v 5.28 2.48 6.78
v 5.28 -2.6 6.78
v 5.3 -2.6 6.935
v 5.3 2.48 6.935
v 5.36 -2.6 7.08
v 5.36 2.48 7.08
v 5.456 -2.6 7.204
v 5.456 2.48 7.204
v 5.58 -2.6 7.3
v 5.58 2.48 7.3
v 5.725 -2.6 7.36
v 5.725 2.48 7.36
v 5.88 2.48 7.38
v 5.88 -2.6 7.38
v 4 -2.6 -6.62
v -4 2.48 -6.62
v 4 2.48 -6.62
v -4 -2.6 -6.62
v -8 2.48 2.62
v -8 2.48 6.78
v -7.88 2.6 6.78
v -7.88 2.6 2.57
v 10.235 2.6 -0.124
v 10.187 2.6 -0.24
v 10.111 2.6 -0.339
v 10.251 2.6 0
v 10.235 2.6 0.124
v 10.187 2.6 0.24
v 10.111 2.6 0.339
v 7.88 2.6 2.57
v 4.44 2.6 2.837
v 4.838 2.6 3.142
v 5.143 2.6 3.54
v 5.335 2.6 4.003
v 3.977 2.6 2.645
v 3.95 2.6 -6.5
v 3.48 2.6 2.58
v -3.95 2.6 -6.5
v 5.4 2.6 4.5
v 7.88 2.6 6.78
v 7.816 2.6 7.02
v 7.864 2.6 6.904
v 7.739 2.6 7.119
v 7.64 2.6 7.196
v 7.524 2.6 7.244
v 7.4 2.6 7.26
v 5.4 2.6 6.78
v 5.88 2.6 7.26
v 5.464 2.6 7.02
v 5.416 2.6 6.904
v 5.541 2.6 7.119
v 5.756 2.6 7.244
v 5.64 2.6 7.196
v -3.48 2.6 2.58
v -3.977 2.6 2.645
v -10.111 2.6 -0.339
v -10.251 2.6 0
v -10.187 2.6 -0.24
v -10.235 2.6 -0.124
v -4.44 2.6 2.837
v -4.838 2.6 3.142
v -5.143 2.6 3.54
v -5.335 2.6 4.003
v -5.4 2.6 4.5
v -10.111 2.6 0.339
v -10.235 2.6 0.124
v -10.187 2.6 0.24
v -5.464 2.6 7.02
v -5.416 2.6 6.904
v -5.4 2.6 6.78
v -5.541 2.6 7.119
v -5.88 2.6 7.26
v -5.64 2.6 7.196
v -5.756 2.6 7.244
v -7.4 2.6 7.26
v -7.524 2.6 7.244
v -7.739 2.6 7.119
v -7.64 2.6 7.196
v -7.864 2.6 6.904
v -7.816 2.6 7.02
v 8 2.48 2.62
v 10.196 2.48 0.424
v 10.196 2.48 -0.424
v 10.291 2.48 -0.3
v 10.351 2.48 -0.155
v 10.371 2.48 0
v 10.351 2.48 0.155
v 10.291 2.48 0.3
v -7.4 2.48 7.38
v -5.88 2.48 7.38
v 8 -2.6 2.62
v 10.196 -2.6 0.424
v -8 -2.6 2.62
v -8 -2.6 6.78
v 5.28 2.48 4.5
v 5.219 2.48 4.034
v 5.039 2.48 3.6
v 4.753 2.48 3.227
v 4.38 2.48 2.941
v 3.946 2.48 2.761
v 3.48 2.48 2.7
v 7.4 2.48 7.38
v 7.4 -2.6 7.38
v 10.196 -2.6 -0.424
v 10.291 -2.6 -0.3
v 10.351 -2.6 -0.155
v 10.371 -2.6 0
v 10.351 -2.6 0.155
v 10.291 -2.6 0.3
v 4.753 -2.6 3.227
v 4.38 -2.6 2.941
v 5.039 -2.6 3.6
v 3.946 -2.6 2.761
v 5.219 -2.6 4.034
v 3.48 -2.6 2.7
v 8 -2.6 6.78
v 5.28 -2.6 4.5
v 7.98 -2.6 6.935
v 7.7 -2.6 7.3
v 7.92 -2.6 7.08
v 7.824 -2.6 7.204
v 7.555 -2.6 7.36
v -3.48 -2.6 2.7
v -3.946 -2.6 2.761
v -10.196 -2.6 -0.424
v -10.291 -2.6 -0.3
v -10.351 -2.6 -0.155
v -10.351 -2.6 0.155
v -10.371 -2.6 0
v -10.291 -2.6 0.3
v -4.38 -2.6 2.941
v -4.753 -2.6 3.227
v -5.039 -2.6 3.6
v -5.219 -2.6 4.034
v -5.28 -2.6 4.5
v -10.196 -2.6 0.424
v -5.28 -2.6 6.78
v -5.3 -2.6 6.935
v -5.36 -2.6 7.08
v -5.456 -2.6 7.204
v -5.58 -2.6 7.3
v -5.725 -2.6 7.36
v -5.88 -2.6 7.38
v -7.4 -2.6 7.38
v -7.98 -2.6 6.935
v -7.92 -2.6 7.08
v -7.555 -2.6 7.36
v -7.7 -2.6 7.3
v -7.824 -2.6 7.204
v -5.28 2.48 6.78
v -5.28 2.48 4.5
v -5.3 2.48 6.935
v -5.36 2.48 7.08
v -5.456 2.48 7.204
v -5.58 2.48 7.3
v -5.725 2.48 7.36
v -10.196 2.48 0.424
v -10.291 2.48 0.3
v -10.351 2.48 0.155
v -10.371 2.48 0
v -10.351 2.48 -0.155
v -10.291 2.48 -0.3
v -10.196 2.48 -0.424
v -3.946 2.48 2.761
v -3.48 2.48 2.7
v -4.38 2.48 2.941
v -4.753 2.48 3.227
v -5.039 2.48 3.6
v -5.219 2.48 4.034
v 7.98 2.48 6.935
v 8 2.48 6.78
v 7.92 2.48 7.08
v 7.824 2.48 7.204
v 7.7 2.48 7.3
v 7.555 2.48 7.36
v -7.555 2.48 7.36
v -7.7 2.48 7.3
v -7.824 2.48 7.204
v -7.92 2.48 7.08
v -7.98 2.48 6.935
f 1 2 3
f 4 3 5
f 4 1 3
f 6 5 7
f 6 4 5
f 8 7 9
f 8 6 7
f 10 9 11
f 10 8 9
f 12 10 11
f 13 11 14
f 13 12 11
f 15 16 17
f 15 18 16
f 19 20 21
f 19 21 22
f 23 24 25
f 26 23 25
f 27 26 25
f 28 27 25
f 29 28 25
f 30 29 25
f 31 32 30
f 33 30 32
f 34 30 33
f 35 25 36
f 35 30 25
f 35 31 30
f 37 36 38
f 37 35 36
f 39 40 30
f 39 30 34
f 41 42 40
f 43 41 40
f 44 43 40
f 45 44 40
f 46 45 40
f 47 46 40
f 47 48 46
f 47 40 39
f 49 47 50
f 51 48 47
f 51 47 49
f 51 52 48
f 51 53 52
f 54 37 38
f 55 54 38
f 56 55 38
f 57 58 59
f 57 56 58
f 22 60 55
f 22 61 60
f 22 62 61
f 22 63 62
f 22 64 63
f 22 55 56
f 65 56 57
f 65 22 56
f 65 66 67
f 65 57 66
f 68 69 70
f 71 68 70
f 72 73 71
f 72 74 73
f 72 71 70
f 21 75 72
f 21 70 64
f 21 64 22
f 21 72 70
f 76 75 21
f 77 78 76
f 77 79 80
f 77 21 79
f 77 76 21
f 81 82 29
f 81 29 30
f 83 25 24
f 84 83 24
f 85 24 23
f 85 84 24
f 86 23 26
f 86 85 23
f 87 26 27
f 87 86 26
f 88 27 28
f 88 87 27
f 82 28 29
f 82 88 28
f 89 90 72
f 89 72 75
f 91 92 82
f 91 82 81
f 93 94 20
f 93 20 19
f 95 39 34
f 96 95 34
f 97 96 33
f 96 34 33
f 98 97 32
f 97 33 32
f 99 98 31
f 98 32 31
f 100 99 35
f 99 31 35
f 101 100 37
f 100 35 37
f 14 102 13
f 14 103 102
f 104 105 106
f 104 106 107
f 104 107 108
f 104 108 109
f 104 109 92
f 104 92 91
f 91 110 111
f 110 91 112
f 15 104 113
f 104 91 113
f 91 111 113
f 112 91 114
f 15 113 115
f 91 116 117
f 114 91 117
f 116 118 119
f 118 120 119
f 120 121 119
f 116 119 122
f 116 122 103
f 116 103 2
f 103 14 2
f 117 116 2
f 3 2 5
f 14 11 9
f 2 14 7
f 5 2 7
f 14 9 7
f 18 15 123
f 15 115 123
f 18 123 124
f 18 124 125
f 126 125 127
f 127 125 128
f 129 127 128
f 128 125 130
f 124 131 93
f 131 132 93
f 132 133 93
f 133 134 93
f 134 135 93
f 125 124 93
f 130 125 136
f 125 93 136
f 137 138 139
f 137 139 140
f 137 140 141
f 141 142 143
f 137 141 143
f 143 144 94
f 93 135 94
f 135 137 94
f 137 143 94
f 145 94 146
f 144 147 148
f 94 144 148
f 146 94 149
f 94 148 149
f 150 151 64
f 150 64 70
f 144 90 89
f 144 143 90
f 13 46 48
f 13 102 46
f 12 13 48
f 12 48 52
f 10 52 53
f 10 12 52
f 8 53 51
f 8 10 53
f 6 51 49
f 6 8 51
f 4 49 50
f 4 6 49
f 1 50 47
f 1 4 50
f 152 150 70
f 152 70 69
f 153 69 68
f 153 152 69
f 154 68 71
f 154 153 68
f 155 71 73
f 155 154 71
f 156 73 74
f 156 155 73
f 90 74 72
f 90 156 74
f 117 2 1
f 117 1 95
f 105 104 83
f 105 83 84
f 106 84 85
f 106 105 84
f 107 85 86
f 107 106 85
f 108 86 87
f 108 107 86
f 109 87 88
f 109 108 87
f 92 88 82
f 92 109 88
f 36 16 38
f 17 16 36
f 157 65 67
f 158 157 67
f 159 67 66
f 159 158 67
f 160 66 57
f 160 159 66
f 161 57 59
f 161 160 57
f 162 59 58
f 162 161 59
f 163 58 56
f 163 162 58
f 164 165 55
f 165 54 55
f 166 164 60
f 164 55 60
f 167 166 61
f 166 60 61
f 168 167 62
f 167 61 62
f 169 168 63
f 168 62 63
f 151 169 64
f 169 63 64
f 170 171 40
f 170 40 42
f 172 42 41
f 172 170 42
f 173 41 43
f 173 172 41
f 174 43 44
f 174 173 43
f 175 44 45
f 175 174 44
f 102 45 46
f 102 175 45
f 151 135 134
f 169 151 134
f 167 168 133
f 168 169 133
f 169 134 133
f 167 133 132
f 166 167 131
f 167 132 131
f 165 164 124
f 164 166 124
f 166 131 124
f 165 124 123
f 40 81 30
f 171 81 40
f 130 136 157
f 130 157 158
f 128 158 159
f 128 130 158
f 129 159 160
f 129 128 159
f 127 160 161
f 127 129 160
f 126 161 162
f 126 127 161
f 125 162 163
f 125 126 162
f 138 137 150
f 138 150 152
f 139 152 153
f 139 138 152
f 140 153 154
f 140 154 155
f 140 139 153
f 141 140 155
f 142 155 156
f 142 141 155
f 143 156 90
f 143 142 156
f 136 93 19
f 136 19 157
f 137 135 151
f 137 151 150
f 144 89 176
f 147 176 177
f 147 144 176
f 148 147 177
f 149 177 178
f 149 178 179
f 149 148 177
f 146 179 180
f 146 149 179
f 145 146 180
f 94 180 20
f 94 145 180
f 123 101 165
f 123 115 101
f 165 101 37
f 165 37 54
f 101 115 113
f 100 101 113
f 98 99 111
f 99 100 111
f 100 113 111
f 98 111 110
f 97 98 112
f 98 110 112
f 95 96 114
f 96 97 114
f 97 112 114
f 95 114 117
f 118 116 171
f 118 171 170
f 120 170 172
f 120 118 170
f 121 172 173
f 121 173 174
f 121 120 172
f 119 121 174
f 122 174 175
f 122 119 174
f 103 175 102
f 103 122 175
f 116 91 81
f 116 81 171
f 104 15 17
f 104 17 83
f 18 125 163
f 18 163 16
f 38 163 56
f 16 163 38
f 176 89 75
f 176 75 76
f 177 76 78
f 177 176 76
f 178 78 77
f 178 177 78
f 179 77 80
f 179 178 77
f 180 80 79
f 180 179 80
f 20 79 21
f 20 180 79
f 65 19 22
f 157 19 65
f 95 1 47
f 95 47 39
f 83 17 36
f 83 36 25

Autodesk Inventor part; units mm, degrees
ref_plane "YZ Plane" through (0, 0, 0) normal (1, 0, 0) x (0, 1, 0)
ref_plane "XZ Plane" through (0, 0, 0) normal (0, 1, 0) x (-1, 0, 0)
ref_plane "XY Plane" through (0, 0, 0) normal (0, 0, 1) x (1, 0, 0)
sketch "Sketch2" plane through (0, 0, 0) normal (0, 1, 0) x (-1, 0, 0)
  line L0 (-3.48, 2.7) -> (3.48, 2.7)
  arc A0 (3.48, 2.7) -> (5.28, 4.5) centre (3.48, 4.5) ccw
  line L1 (5.28, 4.5) -> (5.28, 7.38)
  line L2 (5.28, 7.38) -> (8, 7.38)
  line L3 (8, 7.38) -> (8, 2.62)
  line L4 (8, 2.62) -> (10.62, 0)
  line L5 (10.62, 0) -> (4, -6.62)
  line L6 (4, -6.62) -> (-4, -6.62)
  line L7 (-4, -6.62) -> (-10.62, 0)
  line L8 (-10.62, 0) -> (-8, 2.62)
  line L9 (-8, 2.62) -> (-8, 7.38)
  line L10 (-8, 7.38) -> (-5.28, 7.38)
  line L11 (-5.28, 7.38) -> (-5.28, 4.5)
  arc A1 (-5.28, 4.5) -> (-3.48, 2.7) centre (-3.48, 4.5) ccw
  point P0 (0, 0)
  point P1 (0, 2.7)
  point P2 (0, -6.62)
  dimension "d0" = 1.8
  dimension "d1" = 4.68
  dimension "d2" = 2.72
  dimension "d3" = 10.56
  dimension "d4" = 4.76
  dimension "d5" = 9.32
  dimension "d6" = 8
extrude "Extrusion1" add sketch "Sketch2" along normal mid plane 5.2
fillet "Fillet1" radius 0.6 6 edges at (-8, 0, 7.38) (-5.28, 0, 7.38) (5.28, 0, 7.38) (8, 0, 7.38) (10.62, 0, 0) (-10.62, 0, 0)
chamfer "Chamfer1" distance 0.12 angle 45 20 edges at (-8, 2.6, 4.7) (-7.8243, 2.6, 7.2043) (-6.64, 2.6, 7.38) (-5.4557, 2.6, 7.2043) (-5.28, 2.6, 5.64) (-4.7528, 2.6, 3.2272) (0, 2.6, 2.7) (4.7528, 2.6, 3.2272) (5.28, 2.6, 5.64) (5.4557, 2.6, 7.2043) (6.64, 2.6, 7.38) (7.8243, 2.6, 7.2043) (8, 2.6, 4.7) (-9.0979, 2.6, 1.5221) (-10.3715, 2.6, 0) (-7.0979, 2.6, -3.5221) (0, 2.6, -6.62) (7.0979, 2.6, -3.5221) (10.3715, 2.6, 0) (9.0979, 2.6, 1.5221)
equation "\"d6\" = lu"
equation "\"lu\" = 8"
properties part number "99147-LtBluishGray" material "ABS Plastic"
